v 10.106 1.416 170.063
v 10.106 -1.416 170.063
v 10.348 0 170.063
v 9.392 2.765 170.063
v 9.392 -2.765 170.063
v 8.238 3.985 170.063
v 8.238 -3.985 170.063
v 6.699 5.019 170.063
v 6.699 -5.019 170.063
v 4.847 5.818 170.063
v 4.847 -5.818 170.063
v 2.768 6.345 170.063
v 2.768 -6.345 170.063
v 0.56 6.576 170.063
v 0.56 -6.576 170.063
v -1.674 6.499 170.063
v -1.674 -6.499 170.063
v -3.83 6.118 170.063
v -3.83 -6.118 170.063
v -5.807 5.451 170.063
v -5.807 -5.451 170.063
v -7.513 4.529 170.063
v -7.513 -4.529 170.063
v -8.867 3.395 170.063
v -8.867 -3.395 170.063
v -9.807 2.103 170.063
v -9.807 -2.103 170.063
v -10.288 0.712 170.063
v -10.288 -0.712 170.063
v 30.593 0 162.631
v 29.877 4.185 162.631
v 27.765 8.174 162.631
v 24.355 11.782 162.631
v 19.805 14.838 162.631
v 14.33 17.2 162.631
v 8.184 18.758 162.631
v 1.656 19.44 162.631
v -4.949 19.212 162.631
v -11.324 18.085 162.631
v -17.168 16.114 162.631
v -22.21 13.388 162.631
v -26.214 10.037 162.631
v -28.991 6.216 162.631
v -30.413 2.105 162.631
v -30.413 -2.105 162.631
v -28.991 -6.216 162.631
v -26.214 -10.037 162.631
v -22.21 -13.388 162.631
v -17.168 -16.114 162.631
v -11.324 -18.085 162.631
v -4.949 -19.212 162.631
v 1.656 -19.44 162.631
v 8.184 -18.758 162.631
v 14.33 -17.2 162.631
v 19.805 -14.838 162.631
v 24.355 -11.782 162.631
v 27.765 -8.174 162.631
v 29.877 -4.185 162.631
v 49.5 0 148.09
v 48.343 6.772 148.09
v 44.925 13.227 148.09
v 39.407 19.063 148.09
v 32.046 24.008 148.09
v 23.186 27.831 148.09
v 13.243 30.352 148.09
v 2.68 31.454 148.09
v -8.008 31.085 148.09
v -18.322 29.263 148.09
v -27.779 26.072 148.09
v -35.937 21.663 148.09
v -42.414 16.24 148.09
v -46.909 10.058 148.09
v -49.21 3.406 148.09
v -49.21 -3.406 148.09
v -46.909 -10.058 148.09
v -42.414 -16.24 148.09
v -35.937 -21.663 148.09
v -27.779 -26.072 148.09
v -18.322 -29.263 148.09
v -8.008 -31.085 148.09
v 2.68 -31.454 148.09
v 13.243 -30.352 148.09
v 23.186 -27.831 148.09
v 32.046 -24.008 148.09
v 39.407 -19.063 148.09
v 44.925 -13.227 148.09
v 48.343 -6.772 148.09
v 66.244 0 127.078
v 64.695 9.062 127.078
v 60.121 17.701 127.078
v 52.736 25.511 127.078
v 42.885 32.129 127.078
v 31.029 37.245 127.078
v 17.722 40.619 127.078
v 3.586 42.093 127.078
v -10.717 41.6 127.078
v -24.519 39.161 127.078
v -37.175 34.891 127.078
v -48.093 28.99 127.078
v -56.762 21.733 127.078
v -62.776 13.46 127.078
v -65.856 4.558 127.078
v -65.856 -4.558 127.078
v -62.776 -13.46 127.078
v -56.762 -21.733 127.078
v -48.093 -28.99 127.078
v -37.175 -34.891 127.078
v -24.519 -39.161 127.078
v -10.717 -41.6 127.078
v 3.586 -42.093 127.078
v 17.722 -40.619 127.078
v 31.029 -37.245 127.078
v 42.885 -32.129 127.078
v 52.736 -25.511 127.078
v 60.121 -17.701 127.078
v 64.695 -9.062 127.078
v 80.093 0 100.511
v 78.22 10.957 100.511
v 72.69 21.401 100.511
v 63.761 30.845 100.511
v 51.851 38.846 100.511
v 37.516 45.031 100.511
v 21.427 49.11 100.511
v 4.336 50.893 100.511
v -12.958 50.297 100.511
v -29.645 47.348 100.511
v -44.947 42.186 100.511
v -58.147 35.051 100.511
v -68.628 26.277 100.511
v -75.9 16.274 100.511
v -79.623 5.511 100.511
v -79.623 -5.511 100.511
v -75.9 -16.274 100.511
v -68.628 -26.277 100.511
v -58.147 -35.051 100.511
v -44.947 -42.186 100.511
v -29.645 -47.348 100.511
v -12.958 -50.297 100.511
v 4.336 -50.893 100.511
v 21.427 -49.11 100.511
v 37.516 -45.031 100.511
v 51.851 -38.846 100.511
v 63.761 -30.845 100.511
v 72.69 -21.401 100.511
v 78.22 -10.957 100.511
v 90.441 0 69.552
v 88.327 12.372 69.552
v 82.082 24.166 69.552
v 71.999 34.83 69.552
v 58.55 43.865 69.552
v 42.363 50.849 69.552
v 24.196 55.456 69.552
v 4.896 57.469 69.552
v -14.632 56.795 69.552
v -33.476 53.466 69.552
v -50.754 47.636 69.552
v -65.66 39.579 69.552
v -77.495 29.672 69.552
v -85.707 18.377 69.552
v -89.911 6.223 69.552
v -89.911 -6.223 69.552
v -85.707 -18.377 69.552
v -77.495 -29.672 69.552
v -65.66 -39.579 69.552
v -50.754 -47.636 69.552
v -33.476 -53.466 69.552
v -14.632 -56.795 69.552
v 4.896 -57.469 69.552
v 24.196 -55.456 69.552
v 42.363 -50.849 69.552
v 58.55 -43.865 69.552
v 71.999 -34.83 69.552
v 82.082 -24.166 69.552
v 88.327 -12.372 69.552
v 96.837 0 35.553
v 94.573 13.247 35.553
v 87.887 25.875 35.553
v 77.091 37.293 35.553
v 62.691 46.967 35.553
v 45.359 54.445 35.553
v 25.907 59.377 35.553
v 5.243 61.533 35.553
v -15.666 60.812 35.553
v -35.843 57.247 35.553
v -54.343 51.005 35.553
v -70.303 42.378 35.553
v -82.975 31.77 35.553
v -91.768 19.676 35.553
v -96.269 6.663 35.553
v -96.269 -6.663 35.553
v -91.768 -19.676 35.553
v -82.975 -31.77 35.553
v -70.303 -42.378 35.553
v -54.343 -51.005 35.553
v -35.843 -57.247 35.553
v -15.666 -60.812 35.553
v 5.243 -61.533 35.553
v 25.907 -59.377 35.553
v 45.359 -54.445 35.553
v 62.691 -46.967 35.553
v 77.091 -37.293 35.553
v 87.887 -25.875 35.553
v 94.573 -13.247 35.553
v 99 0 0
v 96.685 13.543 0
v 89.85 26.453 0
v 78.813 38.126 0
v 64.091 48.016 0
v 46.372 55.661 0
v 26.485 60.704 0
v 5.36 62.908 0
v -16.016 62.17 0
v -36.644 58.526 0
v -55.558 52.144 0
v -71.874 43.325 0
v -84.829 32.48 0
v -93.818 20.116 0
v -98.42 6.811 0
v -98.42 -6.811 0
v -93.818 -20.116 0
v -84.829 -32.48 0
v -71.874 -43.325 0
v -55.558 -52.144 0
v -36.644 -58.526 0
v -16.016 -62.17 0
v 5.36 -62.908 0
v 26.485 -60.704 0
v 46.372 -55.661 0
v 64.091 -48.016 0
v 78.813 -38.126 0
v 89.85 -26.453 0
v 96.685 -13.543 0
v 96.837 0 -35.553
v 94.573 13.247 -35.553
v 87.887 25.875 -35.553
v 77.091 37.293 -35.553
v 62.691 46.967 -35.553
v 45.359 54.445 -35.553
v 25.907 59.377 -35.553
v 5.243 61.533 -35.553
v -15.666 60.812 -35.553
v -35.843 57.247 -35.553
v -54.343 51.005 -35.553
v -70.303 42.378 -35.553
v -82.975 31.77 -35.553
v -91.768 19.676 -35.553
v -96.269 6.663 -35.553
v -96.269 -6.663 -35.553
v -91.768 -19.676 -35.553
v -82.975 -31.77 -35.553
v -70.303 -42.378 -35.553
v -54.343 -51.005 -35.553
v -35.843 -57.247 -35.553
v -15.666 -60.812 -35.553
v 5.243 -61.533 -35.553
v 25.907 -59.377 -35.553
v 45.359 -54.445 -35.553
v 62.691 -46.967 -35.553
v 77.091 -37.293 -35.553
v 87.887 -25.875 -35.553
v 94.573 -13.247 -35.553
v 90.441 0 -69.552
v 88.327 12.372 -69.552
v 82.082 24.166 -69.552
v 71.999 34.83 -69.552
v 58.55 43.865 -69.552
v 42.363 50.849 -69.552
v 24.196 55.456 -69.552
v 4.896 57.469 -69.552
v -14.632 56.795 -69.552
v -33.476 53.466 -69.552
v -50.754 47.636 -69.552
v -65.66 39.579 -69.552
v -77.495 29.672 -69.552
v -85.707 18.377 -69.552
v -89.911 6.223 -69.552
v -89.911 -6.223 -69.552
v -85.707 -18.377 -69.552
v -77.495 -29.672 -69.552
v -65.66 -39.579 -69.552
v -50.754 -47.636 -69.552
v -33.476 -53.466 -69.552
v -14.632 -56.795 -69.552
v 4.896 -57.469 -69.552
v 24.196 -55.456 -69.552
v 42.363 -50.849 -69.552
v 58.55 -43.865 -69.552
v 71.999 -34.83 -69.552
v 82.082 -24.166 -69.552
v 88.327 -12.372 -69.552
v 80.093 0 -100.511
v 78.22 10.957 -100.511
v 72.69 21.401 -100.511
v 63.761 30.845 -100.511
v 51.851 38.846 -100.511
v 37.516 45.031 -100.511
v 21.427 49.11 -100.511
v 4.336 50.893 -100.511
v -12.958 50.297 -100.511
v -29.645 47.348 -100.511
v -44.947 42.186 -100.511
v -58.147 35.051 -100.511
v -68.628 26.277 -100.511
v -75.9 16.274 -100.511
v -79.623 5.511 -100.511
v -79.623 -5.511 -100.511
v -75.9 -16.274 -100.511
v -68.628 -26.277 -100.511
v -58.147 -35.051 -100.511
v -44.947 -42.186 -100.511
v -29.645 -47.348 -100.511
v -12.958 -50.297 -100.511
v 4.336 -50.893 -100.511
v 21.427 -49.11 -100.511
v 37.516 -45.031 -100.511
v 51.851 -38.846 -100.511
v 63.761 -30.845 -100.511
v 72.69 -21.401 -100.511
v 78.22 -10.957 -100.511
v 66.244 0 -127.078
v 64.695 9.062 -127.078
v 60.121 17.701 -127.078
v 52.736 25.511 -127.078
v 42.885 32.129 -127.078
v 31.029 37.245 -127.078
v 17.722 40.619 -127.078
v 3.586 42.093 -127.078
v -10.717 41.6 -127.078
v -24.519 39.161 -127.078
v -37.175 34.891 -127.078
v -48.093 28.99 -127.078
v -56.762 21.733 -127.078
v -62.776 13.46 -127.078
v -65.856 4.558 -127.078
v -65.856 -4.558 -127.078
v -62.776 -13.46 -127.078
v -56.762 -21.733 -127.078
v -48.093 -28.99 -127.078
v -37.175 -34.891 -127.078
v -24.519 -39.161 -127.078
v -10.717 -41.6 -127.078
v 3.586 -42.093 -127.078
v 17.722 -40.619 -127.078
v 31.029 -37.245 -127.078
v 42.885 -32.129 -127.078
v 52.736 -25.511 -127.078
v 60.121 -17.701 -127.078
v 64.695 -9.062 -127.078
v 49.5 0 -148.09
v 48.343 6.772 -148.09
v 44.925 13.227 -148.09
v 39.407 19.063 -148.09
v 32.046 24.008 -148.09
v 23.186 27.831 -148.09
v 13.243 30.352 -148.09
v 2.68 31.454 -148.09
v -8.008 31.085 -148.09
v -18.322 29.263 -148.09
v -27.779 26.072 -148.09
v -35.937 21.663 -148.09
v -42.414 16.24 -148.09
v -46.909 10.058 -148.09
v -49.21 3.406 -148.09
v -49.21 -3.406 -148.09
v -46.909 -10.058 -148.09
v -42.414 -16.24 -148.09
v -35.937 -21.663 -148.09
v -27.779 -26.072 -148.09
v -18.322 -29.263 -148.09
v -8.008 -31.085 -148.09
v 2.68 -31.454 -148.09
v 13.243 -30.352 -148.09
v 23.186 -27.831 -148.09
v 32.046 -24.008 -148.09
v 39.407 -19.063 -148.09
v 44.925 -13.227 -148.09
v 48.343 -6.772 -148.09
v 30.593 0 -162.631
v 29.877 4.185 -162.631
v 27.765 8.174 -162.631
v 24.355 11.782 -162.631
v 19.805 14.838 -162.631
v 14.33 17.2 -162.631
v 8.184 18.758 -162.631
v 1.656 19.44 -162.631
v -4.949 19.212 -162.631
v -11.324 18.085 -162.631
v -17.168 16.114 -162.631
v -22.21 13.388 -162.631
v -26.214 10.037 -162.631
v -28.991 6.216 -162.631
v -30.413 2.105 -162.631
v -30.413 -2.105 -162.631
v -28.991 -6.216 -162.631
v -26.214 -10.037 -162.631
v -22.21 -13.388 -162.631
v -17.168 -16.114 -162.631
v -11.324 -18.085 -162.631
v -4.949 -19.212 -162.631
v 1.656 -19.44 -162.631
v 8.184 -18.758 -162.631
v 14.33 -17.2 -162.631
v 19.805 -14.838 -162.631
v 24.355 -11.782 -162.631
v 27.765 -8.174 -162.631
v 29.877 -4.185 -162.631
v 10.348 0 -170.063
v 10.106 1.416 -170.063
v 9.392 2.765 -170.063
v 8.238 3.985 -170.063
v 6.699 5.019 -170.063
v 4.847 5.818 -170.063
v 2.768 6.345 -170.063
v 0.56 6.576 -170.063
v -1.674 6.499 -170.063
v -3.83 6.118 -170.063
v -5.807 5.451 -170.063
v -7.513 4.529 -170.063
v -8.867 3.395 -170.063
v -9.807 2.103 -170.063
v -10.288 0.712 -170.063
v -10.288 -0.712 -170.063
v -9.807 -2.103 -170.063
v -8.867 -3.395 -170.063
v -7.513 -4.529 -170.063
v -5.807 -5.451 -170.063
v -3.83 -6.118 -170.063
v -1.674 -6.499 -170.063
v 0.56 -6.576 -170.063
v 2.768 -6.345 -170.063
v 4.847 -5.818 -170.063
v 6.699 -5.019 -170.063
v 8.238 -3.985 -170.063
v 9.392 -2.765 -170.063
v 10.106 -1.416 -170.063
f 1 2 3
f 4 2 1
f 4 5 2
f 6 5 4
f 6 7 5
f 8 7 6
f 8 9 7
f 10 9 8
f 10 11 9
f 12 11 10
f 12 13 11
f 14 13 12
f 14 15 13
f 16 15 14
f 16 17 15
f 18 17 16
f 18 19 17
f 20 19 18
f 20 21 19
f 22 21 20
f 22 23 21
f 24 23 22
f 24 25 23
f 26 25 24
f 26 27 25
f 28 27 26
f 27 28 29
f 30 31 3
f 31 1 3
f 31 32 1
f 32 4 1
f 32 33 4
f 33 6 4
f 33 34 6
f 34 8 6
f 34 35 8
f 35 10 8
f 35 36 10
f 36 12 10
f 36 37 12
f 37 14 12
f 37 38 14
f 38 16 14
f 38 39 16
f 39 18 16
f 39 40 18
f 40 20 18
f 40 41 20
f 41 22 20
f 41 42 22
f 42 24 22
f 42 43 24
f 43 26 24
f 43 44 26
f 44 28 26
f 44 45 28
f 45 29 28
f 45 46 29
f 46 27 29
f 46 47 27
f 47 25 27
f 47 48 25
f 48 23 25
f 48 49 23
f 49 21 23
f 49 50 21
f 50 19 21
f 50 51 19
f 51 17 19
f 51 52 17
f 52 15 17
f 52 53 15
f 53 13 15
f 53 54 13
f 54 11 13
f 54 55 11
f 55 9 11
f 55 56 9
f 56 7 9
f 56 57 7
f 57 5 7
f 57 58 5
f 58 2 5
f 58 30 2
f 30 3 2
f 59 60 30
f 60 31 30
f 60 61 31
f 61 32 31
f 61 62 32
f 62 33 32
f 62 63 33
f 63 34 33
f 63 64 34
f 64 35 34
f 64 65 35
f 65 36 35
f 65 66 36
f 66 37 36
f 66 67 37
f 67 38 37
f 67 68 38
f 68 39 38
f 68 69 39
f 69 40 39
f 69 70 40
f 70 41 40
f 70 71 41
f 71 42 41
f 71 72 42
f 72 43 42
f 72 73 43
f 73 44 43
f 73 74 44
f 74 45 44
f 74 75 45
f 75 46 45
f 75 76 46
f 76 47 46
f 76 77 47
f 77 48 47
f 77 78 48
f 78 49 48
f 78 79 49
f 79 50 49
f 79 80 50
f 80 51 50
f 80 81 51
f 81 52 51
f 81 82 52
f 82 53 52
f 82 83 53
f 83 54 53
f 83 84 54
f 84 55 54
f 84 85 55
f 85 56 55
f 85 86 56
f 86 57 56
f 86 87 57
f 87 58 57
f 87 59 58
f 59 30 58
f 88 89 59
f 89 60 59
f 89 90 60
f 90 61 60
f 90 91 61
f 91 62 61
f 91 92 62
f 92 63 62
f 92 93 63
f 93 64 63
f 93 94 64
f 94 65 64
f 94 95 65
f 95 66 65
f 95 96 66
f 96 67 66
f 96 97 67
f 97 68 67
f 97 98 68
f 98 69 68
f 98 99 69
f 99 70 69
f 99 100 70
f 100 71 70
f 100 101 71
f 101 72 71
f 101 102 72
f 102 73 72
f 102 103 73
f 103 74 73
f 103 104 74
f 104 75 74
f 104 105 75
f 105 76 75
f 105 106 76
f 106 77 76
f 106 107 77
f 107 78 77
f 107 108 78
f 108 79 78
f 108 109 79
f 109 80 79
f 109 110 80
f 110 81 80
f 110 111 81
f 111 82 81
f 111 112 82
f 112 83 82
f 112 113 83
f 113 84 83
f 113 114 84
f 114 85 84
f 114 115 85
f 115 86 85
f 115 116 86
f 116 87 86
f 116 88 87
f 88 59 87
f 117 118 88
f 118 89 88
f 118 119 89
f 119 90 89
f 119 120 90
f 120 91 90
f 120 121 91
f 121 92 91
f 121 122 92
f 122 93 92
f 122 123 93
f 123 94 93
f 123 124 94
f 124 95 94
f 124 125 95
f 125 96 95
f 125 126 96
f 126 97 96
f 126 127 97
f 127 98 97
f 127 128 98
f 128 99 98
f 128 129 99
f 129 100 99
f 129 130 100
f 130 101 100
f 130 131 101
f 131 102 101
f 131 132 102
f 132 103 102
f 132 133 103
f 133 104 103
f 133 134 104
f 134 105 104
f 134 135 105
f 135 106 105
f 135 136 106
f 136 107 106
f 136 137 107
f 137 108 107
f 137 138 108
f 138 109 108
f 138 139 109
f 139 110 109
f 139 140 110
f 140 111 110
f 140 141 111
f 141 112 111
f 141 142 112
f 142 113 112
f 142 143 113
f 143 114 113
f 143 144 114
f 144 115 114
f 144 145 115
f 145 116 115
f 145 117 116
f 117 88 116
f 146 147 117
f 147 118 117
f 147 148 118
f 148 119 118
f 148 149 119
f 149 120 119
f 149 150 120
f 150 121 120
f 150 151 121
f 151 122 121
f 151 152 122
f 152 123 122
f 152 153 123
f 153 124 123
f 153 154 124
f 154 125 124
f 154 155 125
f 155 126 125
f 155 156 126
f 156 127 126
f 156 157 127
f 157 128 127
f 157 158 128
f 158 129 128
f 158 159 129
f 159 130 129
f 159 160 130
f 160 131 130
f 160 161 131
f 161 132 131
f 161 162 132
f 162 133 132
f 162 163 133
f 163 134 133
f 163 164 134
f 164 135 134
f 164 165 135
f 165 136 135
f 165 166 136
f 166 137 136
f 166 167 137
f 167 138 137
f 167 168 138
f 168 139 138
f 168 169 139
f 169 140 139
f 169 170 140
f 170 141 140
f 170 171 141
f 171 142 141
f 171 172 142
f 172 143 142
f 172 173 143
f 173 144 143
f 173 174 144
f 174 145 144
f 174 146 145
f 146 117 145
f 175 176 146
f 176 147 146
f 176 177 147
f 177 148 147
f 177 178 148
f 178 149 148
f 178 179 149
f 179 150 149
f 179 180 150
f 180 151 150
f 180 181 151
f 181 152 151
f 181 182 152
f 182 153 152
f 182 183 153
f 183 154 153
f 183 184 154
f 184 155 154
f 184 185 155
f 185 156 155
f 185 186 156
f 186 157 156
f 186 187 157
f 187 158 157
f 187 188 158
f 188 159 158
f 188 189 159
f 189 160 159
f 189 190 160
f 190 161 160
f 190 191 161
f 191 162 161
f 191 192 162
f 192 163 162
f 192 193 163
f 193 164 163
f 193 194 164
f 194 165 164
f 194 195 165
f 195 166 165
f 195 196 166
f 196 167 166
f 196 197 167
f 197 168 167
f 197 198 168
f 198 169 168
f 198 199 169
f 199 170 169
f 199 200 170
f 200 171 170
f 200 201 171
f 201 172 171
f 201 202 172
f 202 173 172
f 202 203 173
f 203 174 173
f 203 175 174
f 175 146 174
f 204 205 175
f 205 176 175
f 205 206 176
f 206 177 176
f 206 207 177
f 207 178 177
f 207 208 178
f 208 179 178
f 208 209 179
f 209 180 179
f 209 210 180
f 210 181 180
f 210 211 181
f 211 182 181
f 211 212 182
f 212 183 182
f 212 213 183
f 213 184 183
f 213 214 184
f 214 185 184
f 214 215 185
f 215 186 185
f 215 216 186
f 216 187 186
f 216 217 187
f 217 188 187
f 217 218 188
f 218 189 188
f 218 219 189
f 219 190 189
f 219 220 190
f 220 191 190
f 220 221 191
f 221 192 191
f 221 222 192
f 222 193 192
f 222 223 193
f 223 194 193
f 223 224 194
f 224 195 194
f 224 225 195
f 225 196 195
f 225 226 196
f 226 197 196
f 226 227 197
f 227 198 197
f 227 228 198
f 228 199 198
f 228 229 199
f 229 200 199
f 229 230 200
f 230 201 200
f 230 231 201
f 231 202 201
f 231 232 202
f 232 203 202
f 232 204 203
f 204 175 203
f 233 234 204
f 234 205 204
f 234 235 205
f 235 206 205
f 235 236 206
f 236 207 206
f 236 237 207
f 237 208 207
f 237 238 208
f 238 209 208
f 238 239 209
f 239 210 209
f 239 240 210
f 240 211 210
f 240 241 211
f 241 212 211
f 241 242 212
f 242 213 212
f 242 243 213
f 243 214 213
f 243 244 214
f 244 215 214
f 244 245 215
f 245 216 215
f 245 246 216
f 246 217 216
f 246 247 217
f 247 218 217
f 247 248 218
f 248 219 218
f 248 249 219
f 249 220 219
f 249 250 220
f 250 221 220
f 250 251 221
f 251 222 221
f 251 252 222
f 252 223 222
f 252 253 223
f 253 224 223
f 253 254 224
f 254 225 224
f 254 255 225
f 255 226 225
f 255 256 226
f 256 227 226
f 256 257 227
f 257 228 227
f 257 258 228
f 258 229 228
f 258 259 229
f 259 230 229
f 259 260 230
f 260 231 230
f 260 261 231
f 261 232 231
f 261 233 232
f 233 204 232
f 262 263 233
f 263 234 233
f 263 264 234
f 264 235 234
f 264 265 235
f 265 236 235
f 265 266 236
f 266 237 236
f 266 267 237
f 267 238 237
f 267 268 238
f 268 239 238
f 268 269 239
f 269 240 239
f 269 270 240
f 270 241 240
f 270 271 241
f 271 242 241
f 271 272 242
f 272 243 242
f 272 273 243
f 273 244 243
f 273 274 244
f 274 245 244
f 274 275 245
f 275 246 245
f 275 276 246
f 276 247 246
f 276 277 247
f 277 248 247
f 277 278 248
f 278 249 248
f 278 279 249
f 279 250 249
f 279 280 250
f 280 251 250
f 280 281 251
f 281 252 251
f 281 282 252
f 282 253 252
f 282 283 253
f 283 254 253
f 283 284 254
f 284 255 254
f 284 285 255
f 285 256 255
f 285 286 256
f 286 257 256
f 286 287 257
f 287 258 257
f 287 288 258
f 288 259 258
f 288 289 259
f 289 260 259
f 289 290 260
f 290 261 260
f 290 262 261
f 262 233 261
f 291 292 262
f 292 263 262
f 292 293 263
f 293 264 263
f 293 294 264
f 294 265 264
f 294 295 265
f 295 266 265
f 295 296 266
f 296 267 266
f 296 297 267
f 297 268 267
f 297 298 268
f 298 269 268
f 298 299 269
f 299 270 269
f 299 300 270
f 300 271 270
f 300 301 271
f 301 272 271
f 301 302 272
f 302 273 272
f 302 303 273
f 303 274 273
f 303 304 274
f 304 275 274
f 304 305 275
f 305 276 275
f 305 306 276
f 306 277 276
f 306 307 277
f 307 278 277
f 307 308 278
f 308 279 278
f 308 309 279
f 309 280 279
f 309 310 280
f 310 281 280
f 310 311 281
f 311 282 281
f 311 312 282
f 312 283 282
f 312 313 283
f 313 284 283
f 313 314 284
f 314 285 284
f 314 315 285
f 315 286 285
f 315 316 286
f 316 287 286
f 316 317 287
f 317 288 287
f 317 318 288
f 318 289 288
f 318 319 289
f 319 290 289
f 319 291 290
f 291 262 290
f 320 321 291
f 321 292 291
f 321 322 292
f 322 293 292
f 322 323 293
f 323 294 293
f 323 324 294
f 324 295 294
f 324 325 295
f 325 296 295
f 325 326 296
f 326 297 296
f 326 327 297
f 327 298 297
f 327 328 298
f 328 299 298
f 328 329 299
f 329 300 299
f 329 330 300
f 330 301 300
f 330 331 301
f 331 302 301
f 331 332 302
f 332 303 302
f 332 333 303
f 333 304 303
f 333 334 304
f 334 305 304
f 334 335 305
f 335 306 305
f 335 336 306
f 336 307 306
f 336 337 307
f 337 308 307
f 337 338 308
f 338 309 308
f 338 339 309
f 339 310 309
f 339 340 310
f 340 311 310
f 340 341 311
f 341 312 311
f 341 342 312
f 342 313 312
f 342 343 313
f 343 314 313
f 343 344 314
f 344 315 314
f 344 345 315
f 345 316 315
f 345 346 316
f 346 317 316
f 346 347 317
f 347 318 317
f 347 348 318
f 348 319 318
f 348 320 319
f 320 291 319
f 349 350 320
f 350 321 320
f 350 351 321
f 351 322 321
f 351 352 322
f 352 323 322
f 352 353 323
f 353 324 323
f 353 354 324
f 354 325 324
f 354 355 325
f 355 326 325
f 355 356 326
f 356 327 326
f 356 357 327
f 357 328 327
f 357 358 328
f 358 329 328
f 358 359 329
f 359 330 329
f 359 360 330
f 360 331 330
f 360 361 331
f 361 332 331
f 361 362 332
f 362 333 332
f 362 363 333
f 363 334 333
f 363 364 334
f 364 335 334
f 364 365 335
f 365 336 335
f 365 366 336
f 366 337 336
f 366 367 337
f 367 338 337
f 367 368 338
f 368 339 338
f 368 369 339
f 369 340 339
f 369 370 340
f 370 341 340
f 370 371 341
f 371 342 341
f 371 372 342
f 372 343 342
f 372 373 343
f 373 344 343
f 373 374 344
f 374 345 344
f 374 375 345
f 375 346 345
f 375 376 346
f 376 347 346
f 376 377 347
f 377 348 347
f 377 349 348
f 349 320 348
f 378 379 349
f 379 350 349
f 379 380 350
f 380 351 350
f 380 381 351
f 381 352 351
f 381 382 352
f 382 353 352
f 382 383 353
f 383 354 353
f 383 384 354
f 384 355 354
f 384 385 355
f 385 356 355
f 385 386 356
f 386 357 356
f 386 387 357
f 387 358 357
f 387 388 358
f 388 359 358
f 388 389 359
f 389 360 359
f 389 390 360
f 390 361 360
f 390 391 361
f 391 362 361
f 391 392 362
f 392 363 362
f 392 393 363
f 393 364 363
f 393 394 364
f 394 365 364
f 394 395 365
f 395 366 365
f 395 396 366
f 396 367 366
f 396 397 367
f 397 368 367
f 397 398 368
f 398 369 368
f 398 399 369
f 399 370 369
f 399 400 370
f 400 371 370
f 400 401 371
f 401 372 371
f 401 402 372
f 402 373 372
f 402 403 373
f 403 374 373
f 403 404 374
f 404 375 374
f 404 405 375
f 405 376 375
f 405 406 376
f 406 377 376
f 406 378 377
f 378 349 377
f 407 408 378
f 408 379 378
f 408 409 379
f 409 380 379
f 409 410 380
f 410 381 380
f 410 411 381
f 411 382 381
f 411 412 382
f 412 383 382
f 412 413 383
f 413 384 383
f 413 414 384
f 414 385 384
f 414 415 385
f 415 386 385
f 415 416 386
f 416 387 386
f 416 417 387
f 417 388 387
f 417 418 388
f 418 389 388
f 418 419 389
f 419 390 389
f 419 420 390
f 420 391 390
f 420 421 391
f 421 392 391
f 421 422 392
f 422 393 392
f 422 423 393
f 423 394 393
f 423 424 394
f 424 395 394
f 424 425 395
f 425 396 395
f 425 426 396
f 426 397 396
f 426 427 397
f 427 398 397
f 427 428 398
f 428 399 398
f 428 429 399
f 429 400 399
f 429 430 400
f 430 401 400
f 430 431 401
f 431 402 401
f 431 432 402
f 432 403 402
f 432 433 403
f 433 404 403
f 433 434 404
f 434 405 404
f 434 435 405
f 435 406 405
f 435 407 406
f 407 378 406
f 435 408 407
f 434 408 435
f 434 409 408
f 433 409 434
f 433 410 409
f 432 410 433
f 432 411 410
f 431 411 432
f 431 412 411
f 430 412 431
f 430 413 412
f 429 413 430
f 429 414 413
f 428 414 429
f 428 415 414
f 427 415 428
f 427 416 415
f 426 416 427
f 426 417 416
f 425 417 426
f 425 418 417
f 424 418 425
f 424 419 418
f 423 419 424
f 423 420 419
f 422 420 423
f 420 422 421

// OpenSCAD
// Generated by SolidPython 1.0.1 on 2020-07-29 00:46:49


scale(v = [11, 7, 19]) {
	sphere(r = 9);
}
/***********************************************
*********      SolidPython code:      **********
************************************************
 
# import packages: SolidPython
from solid import *
from solid.utils import *
from itertools import chain, combinations, permutations


class Resize:

    def __init__(self, scad_file):
        self.scad_file = scad_file
        #self.scad_file = import_scad(scad_file)
        # cone/cylinder param:
        self.r1 = 0
        self.r2 = 0
        self.h = 0
        # rectangular prism param:
        self.w = 0
        self.l = 0
        # ellipse param:
        self.r = 0

    # import OpenScad code (file name corresponds to shape)


    # classify shape + parameters
    def assign(self, param1, param2, param3):
        if self.scad_file == 'cone.scad':
            self.r1 = param1
            self.r2 = param2
            self.h = param3
        elif self.scad_file == 'cylinder.scad':
            self.r1 = param1
            self.r2 = param2
            self.h = param3
        elif self.scad_file == 'rectangularPrism.scad':
            self.h = param1
            self.l = param2
            self.w = param3
        else:
            self.r = param1
            self.h = param2

    # resize parameters
    def iterate(self):
        x = range(3, 20, 2)
        i = 1
        if self.scad_file == 'cone.scad':
            tempList = list(permutations(x, 2))
            for temp in tempList:
                param1 = temp[0]
                param2 = temp[1]
                filepath = 'produced_scad_files/' + 'cone' + str(param1) + '_' + str(param2) + '_' + '.scad'
                scad_render_to_file(cylinder(h=param1, r1=param2, r2=0), filepath)

        elif self.scad_file == 'cylinder.scad':
            tempList = list(permutations(x, 3))
            for temp in tempList:
                param1 = temp[0]
                param2 = temp[1]
                filepath = 'produced_scad_files/' + 'cylinder' + str(param1) + '_' + str(param2) + '_' + '.scad'
                scad_render_to_file(cylinder(h=param1, r1=param2, r2=param2), filepath)

        elif self.scad_file == 'rectangularPrism.scad':
            tempList = list(permutations(x, 3))
            for temp in tempList:
                param1 = temp[0]
                param2 = temp[1]
                param3 = temp[2]
                filepath = 'produced_scad_files/' + 'rectangularPrism' + str(param1) + '_' + str(param2) + '_' + str(
                    param3) + '.scad'
                scad_render_to_file(cube(size=(param1, param2, param3)), filepath)

        elif self.scad_file == 'ellipse.scad':
            tempList = list(permutations(x, 4))
            for temp in tempList:
                param1 = temp[0]
                param2 = temp[1]
                param3 = temp[2]
                param4 = temp[3]
                filepath = 'produced_scad_files/' + 'ellipse' + str(param1) + '_' + str(param2) + '_' + str(param3) + '_' + str(param4) + '.scad'
                scad_render_to_file(scale([param1, param2, param3])(sphere(r=param4)), filepath)

    def render_to_scadfile(self):
        scad_render_to_file(scad, 'example.scad') 
 
************************************************/
